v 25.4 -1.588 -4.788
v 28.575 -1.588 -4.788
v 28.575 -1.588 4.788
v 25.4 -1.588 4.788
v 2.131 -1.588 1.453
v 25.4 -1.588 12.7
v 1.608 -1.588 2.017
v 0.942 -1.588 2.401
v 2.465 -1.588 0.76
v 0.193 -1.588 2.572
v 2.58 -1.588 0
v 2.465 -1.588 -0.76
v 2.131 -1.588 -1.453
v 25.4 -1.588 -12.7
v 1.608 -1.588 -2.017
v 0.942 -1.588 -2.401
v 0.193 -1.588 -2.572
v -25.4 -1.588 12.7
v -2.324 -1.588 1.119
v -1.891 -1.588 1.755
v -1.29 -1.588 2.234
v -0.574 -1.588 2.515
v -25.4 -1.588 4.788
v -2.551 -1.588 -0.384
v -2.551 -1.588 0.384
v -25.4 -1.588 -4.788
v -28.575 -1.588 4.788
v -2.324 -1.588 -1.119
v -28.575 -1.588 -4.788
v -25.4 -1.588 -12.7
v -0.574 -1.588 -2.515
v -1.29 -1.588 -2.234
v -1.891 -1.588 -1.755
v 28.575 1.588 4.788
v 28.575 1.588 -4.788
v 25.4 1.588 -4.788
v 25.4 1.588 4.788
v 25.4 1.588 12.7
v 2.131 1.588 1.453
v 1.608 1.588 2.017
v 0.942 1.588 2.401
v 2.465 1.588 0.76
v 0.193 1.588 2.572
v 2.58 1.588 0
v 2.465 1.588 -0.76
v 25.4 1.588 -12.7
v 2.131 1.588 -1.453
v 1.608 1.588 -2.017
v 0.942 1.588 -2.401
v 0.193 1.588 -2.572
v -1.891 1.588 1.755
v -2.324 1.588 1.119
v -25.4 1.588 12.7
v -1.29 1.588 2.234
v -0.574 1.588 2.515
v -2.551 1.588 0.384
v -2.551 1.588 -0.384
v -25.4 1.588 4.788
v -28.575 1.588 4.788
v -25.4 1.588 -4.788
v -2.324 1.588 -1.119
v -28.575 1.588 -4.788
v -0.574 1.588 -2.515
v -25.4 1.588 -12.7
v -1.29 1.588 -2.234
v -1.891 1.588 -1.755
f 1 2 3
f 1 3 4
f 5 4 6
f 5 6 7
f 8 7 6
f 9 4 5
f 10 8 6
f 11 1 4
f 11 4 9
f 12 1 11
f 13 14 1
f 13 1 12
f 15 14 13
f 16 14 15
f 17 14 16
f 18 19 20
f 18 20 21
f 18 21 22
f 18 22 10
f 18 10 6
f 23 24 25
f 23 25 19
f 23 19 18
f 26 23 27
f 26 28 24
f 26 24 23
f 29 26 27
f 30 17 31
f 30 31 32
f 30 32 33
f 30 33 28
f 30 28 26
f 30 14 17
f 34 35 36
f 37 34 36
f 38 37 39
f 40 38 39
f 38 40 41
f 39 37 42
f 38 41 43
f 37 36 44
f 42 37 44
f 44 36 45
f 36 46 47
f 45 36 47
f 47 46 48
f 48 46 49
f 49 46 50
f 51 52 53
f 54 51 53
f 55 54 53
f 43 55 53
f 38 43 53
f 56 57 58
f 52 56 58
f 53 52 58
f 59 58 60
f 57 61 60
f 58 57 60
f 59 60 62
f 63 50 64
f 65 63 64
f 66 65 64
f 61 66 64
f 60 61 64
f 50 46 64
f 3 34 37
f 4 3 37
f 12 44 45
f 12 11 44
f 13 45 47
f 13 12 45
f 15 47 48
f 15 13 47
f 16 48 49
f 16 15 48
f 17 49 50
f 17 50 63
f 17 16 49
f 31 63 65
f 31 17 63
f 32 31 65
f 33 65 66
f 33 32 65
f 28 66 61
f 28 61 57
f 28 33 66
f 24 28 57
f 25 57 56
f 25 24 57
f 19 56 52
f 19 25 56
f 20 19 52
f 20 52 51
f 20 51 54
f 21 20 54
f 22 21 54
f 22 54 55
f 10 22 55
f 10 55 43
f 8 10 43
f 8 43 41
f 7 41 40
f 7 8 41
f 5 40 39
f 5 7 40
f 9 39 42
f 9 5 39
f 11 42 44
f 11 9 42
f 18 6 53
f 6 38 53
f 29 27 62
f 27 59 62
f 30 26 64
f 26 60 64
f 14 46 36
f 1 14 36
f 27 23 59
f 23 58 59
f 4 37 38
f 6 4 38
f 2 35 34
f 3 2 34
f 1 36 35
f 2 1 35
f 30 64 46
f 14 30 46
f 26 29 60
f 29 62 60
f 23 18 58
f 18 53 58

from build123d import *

# Parameters (mm, degrees)
SKETCH1_R           = 2.5796875
BOSS_EXTRUDE1_DEPTH = 1.5875


with BuildPart() as part:
    # Sketch1 → Boss-Extrude1 (new body, symmetric)
    with BuildSketch(Plane(origin=(0, 0, 0), x_dir=(1, 0, 0), z_dir=(0, 1, 0))):
        Polygon((25.4, -4.7879), (25.4, -12.7), (-25.4, -12.7), (-25.4, -4.7879), (-28.575, -4.7879), (-28.575, 4.7879), (-25.4, 4.7879), (-25.4, 12.7), (25.4, 12.7), (25.4, 4.7879), (28.575, 4.7879), (28.575, -4.7879), align=None)
        Circle(SKETCH1_R, mode=Mode.SUBTRACT)
    extrude(amount=BOSS_EXTRUDE1_DEPTH, both=True)


solid = part.part
